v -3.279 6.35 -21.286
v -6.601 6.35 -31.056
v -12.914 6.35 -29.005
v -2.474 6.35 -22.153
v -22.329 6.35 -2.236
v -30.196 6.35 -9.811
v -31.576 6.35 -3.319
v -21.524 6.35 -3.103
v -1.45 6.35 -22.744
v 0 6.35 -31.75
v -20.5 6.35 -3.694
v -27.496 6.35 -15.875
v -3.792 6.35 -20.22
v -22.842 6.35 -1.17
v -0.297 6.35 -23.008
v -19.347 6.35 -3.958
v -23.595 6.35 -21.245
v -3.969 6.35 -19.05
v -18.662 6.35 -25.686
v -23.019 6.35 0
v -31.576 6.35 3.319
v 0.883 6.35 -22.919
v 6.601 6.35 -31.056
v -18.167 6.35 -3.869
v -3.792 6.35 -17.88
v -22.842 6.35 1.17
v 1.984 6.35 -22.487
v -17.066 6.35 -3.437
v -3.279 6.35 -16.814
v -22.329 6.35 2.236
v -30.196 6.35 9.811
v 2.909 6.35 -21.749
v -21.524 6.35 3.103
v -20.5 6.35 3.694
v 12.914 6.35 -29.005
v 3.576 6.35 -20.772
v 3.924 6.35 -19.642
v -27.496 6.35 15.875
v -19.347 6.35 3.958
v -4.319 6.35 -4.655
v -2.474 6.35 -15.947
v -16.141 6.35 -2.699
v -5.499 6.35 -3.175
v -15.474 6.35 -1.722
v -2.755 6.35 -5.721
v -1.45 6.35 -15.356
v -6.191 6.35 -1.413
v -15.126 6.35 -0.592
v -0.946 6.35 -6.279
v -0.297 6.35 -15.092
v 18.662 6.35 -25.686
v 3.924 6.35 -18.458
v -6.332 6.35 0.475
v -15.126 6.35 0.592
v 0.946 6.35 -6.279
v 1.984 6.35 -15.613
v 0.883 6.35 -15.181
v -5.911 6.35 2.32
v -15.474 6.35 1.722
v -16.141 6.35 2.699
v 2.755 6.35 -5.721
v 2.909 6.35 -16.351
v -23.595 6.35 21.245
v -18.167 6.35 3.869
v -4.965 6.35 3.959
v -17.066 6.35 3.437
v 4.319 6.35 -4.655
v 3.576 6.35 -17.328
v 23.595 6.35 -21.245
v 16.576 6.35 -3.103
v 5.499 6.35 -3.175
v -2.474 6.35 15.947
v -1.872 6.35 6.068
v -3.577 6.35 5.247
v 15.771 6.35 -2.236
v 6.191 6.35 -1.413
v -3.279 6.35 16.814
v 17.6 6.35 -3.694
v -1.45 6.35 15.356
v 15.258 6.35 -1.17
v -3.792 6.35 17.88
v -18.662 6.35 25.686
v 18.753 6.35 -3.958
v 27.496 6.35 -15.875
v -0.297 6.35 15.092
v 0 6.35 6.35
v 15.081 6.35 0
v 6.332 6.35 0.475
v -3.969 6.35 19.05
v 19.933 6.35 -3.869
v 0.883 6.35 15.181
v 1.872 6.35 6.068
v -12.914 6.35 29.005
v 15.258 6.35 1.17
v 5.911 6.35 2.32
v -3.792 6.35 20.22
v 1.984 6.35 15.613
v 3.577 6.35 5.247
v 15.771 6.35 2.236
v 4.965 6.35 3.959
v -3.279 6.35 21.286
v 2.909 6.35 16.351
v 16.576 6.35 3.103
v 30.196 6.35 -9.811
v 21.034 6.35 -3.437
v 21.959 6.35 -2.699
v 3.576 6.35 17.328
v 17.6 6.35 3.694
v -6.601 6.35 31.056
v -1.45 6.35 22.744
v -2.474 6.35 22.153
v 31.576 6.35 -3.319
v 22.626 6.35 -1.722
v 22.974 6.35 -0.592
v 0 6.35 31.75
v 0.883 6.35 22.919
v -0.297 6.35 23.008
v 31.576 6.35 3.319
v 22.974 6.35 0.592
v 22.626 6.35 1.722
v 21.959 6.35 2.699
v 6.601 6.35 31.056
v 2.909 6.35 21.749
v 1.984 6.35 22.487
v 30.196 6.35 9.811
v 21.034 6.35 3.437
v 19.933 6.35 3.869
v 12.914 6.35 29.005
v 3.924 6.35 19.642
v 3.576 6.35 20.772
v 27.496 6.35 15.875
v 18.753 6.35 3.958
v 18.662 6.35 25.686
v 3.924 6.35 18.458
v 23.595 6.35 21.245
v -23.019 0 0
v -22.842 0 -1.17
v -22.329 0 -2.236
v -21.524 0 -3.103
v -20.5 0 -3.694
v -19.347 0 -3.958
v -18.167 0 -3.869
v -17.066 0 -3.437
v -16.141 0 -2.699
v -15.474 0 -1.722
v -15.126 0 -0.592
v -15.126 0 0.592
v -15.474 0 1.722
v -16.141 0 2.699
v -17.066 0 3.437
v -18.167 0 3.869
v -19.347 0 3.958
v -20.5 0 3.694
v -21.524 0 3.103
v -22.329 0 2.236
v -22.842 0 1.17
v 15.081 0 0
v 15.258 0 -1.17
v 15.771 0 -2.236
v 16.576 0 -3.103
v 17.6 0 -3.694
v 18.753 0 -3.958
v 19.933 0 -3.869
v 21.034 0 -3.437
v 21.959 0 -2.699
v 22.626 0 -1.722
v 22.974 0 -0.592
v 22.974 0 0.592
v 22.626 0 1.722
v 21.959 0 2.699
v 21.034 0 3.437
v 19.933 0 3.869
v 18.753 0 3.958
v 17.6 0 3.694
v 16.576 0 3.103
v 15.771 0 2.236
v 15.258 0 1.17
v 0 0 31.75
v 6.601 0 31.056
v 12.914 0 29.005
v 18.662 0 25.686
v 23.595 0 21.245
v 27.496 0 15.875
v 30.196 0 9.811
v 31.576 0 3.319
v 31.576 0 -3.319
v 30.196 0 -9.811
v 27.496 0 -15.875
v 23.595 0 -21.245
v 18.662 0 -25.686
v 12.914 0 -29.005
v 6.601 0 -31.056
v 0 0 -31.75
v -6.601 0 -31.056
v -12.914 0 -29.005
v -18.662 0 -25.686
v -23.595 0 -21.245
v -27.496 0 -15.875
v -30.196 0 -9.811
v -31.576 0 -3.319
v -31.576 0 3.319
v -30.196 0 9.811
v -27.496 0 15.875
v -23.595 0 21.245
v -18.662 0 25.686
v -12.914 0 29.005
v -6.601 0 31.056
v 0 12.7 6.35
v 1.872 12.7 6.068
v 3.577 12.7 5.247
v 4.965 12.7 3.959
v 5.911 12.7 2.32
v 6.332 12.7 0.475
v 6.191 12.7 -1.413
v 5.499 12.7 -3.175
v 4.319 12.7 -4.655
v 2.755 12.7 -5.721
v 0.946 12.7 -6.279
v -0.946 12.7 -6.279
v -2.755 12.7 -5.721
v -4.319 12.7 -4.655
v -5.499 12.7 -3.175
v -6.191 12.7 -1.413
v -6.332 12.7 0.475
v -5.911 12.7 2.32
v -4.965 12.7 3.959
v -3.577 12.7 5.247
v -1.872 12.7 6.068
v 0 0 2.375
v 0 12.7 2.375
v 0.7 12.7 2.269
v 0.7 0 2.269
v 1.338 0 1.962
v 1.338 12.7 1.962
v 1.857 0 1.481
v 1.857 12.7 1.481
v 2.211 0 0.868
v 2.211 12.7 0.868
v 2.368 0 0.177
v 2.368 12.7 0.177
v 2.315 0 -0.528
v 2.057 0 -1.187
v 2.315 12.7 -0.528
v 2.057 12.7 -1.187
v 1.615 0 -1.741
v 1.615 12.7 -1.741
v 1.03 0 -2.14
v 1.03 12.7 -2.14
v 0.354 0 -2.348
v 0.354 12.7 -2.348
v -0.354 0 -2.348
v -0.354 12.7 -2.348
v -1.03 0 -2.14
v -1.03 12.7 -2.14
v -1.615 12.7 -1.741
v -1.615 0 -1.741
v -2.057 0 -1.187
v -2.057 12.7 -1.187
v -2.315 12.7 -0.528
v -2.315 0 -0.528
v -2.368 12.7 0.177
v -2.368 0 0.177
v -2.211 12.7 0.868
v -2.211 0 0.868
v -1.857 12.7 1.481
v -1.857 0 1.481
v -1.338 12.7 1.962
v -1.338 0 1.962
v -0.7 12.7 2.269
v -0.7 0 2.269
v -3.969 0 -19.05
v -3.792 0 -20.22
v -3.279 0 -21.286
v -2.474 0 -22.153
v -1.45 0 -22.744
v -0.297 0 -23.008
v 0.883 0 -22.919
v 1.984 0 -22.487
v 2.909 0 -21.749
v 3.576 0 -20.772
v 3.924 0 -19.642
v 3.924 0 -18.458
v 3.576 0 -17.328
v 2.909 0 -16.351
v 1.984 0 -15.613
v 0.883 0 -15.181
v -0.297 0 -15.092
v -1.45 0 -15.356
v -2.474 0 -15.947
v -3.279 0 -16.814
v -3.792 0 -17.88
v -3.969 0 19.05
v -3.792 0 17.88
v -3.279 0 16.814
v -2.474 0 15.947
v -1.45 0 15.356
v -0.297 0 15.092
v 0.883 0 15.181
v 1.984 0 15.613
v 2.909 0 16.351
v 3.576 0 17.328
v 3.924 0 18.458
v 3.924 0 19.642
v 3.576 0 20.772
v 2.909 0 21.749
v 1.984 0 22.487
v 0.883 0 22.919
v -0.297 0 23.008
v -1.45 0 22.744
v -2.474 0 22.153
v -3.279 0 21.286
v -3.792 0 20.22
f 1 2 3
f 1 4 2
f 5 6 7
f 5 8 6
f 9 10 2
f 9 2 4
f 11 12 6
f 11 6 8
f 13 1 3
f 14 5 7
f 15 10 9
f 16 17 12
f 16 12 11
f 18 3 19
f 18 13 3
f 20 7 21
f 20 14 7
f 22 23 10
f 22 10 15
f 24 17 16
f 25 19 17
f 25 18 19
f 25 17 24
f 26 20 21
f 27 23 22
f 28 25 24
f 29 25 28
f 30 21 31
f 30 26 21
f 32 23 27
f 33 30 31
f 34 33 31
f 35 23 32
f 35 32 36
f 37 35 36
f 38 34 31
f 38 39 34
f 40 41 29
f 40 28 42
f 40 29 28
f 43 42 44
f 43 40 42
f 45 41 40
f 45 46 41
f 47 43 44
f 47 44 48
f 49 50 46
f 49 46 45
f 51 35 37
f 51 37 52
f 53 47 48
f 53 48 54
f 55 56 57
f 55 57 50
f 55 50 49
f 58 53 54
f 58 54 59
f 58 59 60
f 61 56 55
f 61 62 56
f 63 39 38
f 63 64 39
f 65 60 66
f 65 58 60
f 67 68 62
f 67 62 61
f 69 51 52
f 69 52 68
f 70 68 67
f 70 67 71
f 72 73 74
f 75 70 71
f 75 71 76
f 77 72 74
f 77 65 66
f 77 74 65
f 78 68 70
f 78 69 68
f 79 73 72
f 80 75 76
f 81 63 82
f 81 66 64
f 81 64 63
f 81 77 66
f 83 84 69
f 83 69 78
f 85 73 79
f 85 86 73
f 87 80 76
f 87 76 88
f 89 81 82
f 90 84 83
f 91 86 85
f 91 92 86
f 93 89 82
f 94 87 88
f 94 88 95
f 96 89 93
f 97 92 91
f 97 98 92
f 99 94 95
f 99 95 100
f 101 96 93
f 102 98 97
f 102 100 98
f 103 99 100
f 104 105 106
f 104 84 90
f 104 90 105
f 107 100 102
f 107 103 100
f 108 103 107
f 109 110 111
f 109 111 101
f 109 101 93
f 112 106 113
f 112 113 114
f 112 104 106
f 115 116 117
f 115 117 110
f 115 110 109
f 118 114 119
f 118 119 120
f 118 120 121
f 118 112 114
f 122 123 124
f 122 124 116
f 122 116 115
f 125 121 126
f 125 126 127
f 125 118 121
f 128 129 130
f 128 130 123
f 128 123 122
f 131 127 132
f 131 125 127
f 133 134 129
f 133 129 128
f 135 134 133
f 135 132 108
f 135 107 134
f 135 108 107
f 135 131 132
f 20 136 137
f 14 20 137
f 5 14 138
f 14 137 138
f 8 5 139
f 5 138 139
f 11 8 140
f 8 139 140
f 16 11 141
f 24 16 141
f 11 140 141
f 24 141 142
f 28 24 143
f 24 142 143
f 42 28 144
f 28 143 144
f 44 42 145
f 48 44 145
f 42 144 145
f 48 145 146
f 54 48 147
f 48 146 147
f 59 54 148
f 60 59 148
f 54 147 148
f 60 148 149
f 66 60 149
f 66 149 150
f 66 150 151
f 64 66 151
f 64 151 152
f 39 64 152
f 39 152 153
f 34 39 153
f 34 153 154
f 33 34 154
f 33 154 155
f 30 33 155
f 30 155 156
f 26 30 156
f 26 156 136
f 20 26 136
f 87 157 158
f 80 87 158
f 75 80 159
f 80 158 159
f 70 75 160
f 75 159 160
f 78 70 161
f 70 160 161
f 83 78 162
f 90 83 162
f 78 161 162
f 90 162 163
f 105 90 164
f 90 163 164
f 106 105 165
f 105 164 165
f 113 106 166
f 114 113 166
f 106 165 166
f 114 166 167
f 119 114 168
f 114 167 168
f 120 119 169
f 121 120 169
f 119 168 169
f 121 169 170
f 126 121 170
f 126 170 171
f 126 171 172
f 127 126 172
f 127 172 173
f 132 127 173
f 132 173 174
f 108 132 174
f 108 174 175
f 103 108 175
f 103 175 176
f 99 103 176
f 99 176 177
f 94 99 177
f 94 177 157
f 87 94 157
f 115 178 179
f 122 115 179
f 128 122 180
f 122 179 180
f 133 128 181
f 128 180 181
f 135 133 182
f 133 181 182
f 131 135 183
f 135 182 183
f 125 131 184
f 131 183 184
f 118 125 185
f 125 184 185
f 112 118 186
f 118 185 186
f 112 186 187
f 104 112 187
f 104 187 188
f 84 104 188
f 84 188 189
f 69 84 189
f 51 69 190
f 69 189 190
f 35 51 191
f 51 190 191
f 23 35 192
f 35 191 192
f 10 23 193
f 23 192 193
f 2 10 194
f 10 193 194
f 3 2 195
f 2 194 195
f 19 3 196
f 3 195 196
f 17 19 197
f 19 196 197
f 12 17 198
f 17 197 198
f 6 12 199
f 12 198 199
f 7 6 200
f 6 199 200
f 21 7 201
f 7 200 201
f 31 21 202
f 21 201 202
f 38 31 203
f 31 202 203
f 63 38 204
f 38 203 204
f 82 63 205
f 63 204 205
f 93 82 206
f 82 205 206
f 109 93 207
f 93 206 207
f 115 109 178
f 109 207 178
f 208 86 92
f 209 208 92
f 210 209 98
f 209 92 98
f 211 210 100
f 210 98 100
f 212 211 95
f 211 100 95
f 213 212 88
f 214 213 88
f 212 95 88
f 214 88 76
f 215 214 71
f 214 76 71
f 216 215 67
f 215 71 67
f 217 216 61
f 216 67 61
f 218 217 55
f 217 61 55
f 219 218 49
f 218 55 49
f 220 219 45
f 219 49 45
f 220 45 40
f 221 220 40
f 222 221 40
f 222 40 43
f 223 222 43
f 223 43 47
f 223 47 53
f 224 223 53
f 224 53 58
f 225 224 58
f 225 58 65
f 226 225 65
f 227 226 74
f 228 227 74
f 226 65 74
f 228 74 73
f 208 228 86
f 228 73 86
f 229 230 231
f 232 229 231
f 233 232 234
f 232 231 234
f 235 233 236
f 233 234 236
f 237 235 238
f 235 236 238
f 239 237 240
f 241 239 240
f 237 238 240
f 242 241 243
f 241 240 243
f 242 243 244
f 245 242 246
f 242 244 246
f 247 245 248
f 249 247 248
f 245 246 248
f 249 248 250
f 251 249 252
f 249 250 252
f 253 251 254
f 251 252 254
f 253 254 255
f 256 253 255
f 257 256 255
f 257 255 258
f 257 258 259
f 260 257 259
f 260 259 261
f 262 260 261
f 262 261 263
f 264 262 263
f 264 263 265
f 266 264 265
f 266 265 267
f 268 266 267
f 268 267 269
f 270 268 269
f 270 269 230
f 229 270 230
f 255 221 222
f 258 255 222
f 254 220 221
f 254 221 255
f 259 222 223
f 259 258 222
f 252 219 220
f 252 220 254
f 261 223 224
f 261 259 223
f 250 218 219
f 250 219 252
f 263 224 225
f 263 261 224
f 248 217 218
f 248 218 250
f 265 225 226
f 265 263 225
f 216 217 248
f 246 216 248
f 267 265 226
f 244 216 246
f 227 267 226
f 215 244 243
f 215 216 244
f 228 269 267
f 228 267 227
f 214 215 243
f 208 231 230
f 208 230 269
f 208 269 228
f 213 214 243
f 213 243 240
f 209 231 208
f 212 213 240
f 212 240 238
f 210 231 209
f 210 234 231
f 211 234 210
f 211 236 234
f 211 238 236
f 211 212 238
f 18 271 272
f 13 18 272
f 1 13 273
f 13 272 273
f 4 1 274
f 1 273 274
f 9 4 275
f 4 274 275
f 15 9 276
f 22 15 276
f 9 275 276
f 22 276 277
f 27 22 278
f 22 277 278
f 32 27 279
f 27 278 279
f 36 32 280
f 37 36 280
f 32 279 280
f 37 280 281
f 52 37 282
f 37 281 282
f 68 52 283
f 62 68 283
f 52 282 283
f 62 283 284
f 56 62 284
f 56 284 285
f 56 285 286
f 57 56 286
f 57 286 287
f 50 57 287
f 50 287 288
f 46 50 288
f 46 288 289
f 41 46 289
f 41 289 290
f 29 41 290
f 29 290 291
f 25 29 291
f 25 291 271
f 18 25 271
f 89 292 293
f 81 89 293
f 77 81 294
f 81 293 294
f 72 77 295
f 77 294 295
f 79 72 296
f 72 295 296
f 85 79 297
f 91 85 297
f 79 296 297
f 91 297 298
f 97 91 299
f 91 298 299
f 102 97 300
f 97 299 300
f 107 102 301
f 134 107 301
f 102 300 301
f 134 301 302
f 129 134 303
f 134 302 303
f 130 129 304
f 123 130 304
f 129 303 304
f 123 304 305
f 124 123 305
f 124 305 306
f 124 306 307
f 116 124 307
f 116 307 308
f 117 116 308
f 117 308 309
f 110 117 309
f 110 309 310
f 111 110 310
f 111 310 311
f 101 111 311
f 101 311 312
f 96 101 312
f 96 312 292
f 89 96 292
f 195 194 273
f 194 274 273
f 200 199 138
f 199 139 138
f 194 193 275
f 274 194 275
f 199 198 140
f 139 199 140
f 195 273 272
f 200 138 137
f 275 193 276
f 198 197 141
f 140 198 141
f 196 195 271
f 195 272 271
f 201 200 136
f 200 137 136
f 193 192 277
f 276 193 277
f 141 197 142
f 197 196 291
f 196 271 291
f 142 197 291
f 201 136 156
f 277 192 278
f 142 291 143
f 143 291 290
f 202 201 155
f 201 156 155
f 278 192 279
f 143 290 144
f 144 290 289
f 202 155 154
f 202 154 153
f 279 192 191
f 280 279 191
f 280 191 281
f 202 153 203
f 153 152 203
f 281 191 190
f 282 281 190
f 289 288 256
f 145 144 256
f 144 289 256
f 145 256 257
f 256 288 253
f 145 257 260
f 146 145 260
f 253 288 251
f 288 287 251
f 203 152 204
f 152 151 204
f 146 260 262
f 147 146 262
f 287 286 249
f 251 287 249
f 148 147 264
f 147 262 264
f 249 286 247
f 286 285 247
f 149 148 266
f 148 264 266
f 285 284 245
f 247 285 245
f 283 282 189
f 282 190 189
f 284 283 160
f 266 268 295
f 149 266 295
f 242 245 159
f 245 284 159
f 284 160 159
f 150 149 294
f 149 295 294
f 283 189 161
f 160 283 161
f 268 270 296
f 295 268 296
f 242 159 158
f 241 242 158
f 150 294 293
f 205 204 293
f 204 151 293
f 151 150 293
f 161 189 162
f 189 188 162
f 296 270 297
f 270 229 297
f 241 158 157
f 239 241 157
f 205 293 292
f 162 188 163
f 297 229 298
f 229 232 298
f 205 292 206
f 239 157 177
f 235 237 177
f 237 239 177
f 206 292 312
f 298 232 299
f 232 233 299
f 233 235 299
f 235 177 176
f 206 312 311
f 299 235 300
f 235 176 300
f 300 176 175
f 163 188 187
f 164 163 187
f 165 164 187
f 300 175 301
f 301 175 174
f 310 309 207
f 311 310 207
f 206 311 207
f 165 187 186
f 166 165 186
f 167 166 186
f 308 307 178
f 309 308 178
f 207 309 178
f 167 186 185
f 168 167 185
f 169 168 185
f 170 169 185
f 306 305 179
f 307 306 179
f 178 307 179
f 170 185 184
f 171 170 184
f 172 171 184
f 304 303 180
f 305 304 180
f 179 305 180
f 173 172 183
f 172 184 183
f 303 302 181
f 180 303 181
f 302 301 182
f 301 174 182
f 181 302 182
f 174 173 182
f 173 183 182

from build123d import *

# Parameters (mm, degrees)
SKETCH1_R                   = 31.75
BOSS_EXTRUDE1_DEPTH         = 6.35
SKETCH2_R                   = 6.35
BOSS_EXTRUDE2_DEPTH         = 6.35
SKETCH3_R                   = 2.3749
CUT_EXTRUDE1_DEPTH          = 47.6627796
F_3_8_16_TAPPED_HOLE1_D     = 7.9375
F_3_8_16_TAPPED_HOLE1_DEPTH = 26.924
F_3_8_16_TAPPED_HOLE1_TIP   = 2.384665582


with BuildPart() as part:
    # Sketch1 → Boss-Extrude1 (new body)
    with BuildSketch(Plane(origin=(0, 0, 0), x_dir=(1, 0, 0), z_dir=(0, 1, 0))):
        with Locations(Location((0, 0, 0), (0, 0, 270))):
            Circle(SKETCH1_R)
    extrude(amount=BOSS_EXTRUDE1_DEPTH)

    # Sketch2 → Boss-Extrude2 (add)
    with BuildSketch(Plane(origin=(0, 6.35, 0), x_dir=(1, 0, 0), z_dir=(0, 1, 0))):
        with Locations(Location((0, 0, 0), (0, 0, 270))):
            Circle(SKETCH2_R)
    extrude(amount=BOSS_EXTRUDE2_DEPTH)

    # Sketch3 → Cut-Extrude1 (cut, through all)
    with BuildSketch(Plane(origin=(0, 12.7, 0), x_dir=(1, 0, 0), z_dir=(0, 1, 0))):
        with Locations(Location((0, 0, 0), (0, 0, 270))):
            Circle(SKETCH3_R)
    extrude(amount=-CUT_EXTRUDE1_DEPTH, mode=Mode.SUBTRACT)

    # 3/8-16 Tapped Hole1
    with Locations(Plane(origin=(0, 6.35, 0), x_dir=(1, 0, 0), z_dir=(0, 1, 0))):
        with Locations((0, 19.05), (19.05, 0), (0, -19.05), (-19.05, 0)):
            Hole(F_3_8_16_TAPPED_HOLE1_D / 2, depth=F_3_8_16_TAPPED_HOLE1_DEPTH)
            with Locations((0, 0, -(F_3_8_16_TAPPED_HOLE1_DEPTH + F_3_8_16_TAPPED_HOLE1_TIP / 2))):  # 118° drill point
                Cone(0, F_3_8_16_TAPPED_HOLE1_D / 2, F_3_8_16_TAPPED_HOLE1_TIP, mode=Mode.SUBTRACT)


solid = part.part
